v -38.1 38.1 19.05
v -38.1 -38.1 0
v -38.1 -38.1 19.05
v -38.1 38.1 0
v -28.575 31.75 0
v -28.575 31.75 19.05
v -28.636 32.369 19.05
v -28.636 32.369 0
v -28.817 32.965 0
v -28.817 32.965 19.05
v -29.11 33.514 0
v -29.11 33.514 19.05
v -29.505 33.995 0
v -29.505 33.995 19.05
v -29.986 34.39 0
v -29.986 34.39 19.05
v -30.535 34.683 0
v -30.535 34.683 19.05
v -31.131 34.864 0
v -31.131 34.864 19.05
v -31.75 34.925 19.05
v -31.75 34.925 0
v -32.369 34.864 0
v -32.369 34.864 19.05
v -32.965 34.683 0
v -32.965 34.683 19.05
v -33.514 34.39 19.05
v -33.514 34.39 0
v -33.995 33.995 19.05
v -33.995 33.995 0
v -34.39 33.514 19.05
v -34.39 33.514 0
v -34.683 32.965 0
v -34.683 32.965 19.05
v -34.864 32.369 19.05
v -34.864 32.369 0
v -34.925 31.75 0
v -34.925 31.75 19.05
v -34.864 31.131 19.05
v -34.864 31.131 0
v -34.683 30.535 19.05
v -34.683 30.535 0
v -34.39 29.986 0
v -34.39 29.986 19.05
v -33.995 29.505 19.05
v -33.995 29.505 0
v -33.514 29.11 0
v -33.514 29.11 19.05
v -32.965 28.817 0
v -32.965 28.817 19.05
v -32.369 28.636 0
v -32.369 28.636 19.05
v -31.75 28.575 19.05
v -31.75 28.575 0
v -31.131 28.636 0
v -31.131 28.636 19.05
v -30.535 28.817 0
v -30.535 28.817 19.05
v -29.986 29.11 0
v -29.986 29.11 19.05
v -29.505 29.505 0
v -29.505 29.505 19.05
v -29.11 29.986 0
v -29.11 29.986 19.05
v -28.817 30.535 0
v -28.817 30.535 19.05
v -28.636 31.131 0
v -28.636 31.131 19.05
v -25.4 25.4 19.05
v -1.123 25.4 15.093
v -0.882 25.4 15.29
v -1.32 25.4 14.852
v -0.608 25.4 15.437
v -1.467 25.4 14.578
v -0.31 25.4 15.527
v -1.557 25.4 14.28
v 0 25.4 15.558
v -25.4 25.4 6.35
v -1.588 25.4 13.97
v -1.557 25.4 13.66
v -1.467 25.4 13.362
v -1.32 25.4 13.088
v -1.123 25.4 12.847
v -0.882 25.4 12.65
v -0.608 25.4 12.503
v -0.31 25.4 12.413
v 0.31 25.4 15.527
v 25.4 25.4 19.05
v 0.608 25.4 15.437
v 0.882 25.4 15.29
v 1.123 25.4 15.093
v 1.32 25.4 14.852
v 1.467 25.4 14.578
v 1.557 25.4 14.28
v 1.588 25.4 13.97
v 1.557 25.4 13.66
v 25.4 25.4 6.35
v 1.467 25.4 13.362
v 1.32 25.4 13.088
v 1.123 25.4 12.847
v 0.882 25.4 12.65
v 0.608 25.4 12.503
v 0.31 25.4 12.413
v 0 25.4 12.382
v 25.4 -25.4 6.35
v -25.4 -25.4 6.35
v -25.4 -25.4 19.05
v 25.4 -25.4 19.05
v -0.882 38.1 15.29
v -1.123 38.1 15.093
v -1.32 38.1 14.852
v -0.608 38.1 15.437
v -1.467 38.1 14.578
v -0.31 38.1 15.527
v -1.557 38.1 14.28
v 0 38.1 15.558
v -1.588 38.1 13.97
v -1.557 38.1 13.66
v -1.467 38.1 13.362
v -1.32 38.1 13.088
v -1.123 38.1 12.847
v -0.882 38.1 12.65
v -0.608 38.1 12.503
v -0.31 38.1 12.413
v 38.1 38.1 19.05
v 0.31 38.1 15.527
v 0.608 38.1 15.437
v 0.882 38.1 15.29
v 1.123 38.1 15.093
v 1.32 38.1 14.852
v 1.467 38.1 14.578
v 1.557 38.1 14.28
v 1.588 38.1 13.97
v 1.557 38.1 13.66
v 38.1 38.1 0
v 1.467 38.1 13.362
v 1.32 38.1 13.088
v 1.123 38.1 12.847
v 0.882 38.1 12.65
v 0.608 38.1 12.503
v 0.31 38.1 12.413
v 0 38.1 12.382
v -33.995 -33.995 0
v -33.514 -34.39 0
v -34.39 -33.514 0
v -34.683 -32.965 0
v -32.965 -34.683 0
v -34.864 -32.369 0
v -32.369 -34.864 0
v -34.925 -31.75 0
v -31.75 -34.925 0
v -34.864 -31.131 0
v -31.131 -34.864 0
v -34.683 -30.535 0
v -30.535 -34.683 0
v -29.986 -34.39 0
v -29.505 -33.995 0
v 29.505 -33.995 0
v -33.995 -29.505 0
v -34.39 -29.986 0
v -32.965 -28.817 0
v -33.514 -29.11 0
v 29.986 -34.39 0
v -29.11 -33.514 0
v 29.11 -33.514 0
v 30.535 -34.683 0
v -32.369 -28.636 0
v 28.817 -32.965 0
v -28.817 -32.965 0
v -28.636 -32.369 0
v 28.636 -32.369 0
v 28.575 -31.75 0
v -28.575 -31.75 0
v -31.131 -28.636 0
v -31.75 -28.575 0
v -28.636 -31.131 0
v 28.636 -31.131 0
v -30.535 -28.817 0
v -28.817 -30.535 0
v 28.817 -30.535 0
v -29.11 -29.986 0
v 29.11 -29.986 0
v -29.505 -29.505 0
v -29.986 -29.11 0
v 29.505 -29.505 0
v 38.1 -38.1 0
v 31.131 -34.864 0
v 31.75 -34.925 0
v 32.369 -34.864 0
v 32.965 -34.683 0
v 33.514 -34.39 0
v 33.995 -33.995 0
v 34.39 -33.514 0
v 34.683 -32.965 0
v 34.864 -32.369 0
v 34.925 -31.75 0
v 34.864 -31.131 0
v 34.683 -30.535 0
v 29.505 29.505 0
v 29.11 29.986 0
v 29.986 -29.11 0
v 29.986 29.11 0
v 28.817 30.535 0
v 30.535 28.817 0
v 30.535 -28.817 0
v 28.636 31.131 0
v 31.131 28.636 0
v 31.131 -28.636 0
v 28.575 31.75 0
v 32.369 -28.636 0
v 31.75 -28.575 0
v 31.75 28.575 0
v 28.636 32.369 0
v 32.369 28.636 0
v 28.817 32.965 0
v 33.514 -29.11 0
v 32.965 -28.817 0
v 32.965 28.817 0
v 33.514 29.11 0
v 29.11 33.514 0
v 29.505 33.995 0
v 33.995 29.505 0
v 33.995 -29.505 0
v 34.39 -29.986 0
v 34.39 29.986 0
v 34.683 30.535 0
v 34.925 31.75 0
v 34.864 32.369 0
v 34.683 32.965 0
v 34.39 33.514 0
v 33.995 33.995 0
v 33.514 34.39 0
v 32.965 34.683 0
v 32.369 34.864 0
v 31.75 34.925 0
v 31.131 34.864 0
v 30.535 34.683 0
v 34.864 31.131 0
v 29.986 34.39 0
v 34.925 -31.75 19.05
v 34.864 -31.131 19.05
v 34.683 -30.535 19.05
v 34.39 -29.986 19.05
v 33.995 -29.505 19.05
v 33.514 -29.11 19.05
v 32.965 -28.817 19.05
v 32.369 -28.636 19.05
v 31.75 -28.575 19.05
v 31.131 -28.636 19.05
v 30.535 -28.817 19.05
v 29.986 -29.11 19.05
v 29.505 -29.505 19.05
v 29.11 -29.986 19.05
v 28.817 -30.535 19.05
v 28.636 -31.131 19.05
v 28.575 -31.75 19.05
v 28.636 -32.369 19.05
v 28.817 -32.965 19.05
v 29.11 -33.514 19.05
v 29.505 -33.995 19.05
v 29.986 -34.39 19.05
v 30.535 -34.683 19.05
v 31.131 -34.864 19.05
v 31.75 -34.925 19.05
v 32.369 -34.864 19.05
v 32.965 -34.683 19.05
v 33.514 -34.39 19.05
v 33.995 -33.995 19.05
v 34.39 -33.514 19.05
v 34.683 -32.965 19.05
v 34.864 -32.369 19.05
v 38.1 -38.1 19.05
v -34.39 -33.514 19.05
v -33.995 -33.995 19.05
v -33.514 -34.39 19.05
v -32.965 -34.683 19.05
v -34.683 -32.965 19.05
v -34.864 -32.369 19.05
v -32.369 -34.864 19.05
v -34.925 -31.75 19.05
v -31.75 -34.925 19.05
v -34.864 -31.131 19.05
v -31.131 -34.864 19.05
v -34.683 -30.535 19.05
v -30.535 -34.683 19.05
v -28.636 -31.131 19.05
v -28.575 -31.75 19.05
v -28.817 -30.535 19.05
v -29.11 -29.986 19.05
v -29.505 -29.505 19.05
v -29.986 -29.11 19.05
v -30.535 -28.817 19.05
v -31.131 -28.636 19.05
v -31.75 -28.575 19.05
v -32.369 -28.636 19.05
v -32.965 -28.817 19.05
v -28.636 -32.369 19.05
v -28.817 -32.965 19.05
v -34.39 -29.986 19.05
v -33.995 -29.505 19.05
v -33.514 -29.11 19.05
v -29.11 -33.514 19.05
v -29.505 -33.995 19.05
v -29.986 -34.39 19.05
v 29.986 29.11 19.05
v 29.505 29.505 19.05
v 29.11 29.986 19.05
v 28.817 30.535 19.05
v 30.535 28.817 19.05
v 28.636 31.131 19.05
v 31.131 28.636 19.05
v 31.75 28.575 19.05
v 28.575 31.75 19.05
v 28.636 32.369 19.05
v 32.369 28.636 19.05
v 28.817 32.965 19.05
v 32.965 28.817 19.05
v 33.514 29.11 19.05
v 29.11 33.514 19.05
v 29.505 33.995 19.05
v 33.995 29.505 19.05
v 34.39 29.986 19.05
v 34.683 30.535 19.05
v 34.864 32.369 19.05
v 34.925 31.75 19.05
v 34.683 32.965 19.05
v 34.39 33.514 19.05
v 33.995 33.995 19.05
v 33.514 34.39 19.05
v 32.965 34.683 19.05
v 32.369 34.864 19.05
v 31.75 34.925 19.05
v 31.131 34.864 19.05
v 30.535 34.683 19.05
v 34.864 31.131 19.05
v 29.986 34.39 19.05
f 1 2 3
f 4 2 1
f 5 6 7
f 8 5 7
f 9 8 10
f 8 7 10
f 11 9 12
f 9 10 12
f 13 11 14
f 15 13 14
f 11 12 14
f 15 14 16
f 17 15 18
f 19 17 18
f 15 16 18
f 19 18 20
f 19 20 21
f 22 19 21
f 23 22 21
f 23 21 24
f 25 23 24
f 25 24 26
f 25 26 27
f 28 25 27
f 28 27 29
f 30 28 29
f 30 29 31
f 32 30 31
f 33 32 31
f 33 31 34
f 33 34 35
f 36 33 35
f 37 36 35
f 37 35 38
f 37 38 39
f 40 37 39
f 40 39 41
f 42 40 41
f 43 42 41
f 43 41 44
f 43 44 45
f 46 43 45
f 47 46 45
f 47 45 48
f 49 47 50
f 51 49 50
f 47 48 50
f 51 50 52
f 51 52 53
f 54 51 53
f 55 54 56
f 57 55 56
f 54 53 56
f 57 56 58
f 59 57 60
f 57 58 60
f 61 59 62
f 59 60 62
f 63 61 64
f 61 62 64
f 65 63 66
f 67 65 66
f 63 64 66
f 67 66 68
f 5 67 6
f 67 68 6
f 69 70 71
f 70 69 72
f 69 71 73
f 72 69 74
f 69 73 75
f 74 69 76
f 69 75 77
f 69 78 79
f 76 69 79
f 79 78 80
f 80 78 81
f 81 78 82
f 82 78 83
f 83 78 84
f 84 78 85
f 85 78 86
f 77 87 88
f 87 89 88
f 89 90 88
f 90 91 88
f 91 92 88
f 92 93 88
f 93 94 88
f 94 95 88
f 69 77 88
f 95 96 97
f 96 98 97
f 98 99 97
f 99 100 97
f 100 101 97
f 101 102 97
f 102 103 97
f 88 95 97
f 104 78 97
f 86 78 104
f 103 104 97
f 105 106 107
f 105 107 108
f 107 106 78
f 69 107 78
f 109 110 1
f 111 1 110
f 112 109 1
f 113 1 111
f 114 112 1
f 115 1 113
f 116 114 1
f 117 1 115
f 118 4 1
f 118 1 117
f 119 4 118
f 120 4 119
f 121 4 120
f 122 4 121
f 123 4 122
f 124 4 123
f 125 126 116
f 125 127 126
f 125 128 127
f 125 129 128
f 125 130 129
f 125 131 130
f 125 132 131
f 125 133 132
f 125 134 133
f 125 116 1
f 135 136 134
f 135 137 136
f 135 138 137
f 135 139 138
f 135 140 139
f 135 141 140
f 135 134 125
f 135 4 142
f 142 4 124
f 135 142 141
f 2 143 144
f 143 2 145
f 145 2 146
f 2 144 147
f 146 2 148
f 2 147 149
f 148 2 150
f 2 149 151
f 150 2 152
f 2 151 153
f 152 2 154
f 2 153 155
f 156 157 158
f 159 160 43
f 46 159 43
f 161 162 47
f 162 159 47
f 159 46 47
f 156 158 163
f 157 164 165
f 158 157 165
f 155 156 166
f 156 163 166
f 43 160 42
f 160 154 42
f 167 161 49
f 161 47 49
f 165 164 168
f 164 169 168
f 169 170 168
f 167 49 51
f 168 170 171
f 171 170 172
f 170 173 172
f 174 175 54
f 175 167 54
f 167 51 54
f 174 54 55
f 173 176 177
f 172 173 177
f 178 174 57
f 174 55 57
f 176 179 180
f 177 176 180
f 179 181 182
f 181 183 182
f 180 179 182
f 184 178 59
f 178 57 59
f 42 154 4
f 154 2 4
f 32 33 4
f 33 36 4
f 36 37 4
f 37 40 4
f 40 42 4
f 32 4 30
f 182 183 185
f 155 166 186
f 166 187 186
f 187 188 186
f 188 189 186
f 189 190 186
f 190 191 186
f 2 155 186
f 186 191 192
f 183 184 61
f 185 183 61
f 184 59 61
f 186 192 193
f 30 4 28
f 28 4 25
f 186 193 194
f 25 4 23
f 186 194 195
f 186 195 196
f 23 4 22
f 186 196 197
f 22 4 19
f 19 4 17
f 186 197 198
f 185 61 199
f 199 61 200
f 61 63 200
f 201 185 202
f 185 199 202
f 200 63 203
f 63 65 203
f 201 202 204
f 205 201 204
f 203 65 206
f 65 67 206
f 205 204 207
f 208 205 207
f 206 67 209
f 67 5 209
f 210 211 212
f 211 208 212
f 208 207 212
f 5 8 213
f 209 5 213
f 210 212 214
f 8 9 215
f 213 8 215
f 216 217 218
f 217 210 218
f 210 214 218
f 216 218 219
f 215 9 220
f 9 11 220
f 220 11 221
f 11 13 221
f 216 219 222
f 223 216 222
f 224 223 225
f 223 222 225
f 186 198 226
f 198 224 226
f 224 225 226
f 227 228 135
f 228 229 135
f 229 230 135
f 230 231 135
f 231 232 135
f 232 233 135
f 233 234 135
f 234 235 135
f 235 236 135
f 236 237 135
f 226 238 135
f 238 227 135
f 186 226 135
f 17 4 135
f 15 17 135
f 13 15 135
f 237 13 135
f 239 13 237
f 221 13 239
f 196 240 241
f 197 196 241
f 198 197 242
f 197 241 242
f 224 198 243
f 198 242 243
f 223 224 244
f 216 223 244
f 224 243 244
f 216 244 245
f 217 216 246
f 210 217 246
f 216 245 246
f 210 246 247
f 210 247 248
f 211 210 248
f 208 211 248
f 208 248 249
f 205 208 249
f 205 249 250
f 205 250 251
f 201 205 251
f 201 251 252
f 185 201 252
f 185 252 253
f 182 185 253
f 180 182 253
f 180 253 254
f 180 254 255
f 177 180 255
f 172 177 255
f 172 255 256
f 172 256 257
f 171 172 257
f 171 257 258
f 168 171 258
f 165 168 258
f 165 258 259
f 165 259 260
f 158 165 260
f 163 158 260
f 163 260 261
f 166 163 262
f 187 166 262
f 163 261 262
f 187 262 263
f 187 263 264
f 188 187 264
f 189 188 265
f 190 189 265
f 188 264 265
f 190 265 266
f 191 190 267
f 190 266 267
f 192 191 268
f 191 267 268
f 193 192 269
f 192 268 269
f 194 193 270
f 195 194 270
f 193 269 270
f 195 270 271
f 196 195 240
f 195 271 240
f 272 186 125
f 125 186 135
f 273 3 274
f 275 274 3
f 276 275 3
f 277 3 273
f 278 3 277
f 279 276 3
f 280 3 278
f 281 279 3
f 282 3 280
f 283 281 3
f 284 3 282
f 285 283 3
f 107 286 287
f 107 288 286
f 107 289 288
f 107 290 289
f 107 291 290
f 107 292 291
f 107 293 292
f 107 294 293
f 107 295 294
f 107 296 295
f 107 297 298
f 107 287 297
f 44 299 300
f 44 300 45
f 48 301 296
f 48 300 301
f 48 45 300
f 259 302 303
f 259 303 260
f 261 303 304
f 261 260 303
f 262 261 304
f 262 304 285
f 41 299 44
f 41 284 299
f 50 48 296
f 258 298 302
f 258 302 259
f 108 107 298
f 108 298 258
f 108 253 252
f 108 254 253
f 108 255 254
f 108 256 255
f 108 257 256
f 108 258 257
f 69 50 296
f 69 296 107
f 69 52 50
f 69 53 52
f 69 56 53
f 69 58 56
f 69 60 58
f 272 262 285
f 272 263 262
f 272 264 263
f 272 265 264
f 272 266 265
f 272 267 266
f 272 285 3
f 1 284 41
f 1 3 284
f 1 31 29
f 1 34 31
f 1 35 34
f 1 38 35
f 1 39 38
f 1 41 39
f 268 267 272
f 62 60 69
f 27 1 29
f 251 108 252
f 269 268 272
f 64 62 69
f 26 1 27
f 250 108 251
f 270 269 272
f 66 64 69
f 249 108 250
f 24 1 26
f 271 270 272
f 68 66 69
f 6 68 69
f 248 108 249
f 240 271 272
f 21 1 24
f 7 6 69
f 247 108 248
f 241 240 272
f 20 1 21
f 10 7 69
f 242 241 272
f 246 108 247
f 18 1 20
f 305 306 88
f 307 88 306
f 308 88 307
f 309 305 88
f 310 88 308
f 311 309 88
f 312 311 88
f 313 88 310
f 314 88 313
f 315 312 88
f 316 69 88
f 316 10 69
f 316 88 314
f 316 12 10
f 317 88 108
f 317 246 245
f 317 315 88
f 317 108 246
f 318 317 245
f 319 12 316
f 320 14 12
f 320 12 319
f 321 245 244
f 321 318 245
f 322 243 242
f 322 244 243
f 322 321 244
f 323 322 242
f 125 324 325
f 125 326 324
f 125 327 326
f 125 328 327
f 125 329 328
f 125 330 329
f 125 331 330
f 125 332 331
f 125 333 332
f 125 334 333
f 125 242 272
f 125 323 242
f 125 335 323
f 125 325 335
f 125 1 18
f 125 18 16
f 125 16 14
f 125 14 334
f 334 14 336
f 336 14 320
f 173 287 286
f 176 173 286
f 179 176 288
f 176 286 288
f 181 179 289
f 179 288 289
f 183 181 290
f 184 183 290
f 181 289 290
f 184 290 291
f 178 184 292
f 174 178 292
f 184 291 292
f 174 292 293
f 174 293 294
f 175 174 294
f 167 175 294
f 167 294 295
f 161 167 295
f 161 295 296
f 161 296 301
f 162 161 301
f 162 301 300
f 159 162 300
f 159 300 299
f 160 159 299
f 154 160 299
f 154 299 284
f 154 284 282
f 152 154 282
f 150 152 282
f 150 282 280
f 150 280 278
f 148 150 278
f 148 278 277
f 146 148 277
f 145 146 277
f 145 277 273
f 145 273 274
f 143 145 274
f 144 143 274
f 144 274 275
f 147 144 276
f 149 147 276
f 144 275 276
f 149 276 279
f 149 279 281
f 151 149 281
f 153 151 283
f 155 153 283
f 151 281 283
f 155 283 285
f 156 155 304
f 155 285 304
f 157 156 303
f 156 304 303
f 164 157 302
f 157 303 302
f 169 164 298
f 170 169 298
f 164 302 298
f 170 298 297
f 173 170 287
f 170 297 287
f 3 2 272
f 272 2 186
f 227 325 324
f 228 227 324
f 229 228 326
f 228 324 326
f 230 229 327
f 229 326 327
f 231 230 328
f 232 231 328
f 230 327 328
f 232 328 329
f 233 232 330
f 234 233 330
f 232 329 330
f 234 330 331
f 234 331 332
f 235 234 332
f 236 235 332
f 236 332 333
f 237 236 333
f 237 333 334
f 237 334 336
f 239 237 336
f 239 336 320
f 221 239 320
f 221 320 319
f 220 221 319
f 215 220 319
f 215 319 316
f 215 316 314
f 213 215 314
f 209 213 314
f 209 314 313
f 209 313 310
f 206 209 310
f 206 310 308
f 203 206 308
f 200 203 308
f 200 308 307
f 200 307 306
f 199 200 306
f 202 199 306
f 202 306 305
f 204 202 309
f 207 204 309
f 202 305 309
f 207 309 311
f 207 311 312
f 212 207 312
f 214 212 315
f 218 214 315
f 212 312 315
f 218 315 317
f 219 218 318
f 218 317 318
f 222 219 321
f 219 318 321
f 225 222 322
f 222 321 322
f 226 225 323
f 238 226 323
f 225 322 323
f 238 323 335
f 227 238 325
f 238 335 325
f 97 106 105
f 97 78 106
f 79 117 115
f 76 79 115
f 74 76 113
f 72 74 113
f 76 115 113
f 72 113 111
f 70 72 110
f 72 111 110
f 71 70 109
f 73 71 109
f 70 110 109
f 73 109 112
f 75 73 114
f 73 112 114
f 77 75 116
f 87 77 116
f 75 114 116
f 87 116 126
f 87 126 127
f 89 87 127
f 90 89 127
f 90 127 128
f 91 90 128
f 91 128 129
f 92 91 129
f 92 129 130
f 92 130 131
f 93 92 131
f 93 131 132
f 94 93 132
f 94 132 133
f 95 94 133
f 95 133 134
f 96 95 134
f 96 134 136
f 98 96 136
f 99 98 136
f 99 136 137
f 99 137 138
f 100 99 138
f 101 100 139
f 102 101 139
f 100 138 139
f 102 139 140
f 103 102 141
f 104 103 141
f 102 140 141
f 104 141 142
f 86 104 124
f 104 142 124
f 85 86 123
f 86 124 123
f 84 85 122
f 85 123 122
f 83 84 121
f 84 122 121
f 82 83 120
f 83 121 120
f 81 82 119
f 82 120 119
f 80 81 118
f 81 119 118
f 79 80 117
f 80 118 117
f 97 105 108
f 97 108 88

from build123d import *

# Parameters (mm, degrees)
F0_W     = 76.2
F0_H     = 76.2
F0_W_2   = 50.8
F0_H_2   = 50.8
F1_DEPTH = 6.35
F2_DEPTH = 19.05
F3_R     = 1.5875
F4_DEPTH = 25.4
F5_R     = 3.175
F6_DEPTH = 19.051


with BuildPart() as f1:
    # F0 (on Top) → F1 (new body)
    with BuildSketch(Plane.XY):
        Rectangle(F0_W, F0_H)
        Rectangle(F0_W_2, F0_H_2, mode=Mode.SUBTRACT)
        Rectangle(F0_W_2, F0_H_2)
    extrude(amount=F1_DEPTH)

    # F0 (on Top) → F2 (join)
    with BuildSketch(Plane.XY):
        Rectangle(F0_W, F0_H)
        Rectangle(F0_W_2, F0_H_2, mode=Mode.SUBTRACT)
    extrude(amount=F2_DEPTH)

    # F3 (on face) → F4 (cut)
    with BuildSketch(Plane(origin=(0, 38.1, 0), x_dir=(-1, 0, 0), z_dir=(0, 1, 0))):
        with Locations((0, 13.97)):
            Circle(F3_R)
    extrude(amount=-F4_DEPTH, mode=Mode.SUBTRACT)

    # F5 (on face) → F6 (cut, through all)
    with BuildSketch(Plane.XY.offset(19.05)):
        with Locations((-31.75, 31.75)):
            Circle(F5_R)
        with Locations((31.75, 31.75)):
            Circle(F5_R)
        with Locations((31.75, -31.75)):
            Circle(F5_R)
        with Locations((-31.75, -31.75)):
            Circle(F5_R)
    extrude(amount=-F6_DEPTH, mode=Mode.SUBTRACT)


solid = f1.part
